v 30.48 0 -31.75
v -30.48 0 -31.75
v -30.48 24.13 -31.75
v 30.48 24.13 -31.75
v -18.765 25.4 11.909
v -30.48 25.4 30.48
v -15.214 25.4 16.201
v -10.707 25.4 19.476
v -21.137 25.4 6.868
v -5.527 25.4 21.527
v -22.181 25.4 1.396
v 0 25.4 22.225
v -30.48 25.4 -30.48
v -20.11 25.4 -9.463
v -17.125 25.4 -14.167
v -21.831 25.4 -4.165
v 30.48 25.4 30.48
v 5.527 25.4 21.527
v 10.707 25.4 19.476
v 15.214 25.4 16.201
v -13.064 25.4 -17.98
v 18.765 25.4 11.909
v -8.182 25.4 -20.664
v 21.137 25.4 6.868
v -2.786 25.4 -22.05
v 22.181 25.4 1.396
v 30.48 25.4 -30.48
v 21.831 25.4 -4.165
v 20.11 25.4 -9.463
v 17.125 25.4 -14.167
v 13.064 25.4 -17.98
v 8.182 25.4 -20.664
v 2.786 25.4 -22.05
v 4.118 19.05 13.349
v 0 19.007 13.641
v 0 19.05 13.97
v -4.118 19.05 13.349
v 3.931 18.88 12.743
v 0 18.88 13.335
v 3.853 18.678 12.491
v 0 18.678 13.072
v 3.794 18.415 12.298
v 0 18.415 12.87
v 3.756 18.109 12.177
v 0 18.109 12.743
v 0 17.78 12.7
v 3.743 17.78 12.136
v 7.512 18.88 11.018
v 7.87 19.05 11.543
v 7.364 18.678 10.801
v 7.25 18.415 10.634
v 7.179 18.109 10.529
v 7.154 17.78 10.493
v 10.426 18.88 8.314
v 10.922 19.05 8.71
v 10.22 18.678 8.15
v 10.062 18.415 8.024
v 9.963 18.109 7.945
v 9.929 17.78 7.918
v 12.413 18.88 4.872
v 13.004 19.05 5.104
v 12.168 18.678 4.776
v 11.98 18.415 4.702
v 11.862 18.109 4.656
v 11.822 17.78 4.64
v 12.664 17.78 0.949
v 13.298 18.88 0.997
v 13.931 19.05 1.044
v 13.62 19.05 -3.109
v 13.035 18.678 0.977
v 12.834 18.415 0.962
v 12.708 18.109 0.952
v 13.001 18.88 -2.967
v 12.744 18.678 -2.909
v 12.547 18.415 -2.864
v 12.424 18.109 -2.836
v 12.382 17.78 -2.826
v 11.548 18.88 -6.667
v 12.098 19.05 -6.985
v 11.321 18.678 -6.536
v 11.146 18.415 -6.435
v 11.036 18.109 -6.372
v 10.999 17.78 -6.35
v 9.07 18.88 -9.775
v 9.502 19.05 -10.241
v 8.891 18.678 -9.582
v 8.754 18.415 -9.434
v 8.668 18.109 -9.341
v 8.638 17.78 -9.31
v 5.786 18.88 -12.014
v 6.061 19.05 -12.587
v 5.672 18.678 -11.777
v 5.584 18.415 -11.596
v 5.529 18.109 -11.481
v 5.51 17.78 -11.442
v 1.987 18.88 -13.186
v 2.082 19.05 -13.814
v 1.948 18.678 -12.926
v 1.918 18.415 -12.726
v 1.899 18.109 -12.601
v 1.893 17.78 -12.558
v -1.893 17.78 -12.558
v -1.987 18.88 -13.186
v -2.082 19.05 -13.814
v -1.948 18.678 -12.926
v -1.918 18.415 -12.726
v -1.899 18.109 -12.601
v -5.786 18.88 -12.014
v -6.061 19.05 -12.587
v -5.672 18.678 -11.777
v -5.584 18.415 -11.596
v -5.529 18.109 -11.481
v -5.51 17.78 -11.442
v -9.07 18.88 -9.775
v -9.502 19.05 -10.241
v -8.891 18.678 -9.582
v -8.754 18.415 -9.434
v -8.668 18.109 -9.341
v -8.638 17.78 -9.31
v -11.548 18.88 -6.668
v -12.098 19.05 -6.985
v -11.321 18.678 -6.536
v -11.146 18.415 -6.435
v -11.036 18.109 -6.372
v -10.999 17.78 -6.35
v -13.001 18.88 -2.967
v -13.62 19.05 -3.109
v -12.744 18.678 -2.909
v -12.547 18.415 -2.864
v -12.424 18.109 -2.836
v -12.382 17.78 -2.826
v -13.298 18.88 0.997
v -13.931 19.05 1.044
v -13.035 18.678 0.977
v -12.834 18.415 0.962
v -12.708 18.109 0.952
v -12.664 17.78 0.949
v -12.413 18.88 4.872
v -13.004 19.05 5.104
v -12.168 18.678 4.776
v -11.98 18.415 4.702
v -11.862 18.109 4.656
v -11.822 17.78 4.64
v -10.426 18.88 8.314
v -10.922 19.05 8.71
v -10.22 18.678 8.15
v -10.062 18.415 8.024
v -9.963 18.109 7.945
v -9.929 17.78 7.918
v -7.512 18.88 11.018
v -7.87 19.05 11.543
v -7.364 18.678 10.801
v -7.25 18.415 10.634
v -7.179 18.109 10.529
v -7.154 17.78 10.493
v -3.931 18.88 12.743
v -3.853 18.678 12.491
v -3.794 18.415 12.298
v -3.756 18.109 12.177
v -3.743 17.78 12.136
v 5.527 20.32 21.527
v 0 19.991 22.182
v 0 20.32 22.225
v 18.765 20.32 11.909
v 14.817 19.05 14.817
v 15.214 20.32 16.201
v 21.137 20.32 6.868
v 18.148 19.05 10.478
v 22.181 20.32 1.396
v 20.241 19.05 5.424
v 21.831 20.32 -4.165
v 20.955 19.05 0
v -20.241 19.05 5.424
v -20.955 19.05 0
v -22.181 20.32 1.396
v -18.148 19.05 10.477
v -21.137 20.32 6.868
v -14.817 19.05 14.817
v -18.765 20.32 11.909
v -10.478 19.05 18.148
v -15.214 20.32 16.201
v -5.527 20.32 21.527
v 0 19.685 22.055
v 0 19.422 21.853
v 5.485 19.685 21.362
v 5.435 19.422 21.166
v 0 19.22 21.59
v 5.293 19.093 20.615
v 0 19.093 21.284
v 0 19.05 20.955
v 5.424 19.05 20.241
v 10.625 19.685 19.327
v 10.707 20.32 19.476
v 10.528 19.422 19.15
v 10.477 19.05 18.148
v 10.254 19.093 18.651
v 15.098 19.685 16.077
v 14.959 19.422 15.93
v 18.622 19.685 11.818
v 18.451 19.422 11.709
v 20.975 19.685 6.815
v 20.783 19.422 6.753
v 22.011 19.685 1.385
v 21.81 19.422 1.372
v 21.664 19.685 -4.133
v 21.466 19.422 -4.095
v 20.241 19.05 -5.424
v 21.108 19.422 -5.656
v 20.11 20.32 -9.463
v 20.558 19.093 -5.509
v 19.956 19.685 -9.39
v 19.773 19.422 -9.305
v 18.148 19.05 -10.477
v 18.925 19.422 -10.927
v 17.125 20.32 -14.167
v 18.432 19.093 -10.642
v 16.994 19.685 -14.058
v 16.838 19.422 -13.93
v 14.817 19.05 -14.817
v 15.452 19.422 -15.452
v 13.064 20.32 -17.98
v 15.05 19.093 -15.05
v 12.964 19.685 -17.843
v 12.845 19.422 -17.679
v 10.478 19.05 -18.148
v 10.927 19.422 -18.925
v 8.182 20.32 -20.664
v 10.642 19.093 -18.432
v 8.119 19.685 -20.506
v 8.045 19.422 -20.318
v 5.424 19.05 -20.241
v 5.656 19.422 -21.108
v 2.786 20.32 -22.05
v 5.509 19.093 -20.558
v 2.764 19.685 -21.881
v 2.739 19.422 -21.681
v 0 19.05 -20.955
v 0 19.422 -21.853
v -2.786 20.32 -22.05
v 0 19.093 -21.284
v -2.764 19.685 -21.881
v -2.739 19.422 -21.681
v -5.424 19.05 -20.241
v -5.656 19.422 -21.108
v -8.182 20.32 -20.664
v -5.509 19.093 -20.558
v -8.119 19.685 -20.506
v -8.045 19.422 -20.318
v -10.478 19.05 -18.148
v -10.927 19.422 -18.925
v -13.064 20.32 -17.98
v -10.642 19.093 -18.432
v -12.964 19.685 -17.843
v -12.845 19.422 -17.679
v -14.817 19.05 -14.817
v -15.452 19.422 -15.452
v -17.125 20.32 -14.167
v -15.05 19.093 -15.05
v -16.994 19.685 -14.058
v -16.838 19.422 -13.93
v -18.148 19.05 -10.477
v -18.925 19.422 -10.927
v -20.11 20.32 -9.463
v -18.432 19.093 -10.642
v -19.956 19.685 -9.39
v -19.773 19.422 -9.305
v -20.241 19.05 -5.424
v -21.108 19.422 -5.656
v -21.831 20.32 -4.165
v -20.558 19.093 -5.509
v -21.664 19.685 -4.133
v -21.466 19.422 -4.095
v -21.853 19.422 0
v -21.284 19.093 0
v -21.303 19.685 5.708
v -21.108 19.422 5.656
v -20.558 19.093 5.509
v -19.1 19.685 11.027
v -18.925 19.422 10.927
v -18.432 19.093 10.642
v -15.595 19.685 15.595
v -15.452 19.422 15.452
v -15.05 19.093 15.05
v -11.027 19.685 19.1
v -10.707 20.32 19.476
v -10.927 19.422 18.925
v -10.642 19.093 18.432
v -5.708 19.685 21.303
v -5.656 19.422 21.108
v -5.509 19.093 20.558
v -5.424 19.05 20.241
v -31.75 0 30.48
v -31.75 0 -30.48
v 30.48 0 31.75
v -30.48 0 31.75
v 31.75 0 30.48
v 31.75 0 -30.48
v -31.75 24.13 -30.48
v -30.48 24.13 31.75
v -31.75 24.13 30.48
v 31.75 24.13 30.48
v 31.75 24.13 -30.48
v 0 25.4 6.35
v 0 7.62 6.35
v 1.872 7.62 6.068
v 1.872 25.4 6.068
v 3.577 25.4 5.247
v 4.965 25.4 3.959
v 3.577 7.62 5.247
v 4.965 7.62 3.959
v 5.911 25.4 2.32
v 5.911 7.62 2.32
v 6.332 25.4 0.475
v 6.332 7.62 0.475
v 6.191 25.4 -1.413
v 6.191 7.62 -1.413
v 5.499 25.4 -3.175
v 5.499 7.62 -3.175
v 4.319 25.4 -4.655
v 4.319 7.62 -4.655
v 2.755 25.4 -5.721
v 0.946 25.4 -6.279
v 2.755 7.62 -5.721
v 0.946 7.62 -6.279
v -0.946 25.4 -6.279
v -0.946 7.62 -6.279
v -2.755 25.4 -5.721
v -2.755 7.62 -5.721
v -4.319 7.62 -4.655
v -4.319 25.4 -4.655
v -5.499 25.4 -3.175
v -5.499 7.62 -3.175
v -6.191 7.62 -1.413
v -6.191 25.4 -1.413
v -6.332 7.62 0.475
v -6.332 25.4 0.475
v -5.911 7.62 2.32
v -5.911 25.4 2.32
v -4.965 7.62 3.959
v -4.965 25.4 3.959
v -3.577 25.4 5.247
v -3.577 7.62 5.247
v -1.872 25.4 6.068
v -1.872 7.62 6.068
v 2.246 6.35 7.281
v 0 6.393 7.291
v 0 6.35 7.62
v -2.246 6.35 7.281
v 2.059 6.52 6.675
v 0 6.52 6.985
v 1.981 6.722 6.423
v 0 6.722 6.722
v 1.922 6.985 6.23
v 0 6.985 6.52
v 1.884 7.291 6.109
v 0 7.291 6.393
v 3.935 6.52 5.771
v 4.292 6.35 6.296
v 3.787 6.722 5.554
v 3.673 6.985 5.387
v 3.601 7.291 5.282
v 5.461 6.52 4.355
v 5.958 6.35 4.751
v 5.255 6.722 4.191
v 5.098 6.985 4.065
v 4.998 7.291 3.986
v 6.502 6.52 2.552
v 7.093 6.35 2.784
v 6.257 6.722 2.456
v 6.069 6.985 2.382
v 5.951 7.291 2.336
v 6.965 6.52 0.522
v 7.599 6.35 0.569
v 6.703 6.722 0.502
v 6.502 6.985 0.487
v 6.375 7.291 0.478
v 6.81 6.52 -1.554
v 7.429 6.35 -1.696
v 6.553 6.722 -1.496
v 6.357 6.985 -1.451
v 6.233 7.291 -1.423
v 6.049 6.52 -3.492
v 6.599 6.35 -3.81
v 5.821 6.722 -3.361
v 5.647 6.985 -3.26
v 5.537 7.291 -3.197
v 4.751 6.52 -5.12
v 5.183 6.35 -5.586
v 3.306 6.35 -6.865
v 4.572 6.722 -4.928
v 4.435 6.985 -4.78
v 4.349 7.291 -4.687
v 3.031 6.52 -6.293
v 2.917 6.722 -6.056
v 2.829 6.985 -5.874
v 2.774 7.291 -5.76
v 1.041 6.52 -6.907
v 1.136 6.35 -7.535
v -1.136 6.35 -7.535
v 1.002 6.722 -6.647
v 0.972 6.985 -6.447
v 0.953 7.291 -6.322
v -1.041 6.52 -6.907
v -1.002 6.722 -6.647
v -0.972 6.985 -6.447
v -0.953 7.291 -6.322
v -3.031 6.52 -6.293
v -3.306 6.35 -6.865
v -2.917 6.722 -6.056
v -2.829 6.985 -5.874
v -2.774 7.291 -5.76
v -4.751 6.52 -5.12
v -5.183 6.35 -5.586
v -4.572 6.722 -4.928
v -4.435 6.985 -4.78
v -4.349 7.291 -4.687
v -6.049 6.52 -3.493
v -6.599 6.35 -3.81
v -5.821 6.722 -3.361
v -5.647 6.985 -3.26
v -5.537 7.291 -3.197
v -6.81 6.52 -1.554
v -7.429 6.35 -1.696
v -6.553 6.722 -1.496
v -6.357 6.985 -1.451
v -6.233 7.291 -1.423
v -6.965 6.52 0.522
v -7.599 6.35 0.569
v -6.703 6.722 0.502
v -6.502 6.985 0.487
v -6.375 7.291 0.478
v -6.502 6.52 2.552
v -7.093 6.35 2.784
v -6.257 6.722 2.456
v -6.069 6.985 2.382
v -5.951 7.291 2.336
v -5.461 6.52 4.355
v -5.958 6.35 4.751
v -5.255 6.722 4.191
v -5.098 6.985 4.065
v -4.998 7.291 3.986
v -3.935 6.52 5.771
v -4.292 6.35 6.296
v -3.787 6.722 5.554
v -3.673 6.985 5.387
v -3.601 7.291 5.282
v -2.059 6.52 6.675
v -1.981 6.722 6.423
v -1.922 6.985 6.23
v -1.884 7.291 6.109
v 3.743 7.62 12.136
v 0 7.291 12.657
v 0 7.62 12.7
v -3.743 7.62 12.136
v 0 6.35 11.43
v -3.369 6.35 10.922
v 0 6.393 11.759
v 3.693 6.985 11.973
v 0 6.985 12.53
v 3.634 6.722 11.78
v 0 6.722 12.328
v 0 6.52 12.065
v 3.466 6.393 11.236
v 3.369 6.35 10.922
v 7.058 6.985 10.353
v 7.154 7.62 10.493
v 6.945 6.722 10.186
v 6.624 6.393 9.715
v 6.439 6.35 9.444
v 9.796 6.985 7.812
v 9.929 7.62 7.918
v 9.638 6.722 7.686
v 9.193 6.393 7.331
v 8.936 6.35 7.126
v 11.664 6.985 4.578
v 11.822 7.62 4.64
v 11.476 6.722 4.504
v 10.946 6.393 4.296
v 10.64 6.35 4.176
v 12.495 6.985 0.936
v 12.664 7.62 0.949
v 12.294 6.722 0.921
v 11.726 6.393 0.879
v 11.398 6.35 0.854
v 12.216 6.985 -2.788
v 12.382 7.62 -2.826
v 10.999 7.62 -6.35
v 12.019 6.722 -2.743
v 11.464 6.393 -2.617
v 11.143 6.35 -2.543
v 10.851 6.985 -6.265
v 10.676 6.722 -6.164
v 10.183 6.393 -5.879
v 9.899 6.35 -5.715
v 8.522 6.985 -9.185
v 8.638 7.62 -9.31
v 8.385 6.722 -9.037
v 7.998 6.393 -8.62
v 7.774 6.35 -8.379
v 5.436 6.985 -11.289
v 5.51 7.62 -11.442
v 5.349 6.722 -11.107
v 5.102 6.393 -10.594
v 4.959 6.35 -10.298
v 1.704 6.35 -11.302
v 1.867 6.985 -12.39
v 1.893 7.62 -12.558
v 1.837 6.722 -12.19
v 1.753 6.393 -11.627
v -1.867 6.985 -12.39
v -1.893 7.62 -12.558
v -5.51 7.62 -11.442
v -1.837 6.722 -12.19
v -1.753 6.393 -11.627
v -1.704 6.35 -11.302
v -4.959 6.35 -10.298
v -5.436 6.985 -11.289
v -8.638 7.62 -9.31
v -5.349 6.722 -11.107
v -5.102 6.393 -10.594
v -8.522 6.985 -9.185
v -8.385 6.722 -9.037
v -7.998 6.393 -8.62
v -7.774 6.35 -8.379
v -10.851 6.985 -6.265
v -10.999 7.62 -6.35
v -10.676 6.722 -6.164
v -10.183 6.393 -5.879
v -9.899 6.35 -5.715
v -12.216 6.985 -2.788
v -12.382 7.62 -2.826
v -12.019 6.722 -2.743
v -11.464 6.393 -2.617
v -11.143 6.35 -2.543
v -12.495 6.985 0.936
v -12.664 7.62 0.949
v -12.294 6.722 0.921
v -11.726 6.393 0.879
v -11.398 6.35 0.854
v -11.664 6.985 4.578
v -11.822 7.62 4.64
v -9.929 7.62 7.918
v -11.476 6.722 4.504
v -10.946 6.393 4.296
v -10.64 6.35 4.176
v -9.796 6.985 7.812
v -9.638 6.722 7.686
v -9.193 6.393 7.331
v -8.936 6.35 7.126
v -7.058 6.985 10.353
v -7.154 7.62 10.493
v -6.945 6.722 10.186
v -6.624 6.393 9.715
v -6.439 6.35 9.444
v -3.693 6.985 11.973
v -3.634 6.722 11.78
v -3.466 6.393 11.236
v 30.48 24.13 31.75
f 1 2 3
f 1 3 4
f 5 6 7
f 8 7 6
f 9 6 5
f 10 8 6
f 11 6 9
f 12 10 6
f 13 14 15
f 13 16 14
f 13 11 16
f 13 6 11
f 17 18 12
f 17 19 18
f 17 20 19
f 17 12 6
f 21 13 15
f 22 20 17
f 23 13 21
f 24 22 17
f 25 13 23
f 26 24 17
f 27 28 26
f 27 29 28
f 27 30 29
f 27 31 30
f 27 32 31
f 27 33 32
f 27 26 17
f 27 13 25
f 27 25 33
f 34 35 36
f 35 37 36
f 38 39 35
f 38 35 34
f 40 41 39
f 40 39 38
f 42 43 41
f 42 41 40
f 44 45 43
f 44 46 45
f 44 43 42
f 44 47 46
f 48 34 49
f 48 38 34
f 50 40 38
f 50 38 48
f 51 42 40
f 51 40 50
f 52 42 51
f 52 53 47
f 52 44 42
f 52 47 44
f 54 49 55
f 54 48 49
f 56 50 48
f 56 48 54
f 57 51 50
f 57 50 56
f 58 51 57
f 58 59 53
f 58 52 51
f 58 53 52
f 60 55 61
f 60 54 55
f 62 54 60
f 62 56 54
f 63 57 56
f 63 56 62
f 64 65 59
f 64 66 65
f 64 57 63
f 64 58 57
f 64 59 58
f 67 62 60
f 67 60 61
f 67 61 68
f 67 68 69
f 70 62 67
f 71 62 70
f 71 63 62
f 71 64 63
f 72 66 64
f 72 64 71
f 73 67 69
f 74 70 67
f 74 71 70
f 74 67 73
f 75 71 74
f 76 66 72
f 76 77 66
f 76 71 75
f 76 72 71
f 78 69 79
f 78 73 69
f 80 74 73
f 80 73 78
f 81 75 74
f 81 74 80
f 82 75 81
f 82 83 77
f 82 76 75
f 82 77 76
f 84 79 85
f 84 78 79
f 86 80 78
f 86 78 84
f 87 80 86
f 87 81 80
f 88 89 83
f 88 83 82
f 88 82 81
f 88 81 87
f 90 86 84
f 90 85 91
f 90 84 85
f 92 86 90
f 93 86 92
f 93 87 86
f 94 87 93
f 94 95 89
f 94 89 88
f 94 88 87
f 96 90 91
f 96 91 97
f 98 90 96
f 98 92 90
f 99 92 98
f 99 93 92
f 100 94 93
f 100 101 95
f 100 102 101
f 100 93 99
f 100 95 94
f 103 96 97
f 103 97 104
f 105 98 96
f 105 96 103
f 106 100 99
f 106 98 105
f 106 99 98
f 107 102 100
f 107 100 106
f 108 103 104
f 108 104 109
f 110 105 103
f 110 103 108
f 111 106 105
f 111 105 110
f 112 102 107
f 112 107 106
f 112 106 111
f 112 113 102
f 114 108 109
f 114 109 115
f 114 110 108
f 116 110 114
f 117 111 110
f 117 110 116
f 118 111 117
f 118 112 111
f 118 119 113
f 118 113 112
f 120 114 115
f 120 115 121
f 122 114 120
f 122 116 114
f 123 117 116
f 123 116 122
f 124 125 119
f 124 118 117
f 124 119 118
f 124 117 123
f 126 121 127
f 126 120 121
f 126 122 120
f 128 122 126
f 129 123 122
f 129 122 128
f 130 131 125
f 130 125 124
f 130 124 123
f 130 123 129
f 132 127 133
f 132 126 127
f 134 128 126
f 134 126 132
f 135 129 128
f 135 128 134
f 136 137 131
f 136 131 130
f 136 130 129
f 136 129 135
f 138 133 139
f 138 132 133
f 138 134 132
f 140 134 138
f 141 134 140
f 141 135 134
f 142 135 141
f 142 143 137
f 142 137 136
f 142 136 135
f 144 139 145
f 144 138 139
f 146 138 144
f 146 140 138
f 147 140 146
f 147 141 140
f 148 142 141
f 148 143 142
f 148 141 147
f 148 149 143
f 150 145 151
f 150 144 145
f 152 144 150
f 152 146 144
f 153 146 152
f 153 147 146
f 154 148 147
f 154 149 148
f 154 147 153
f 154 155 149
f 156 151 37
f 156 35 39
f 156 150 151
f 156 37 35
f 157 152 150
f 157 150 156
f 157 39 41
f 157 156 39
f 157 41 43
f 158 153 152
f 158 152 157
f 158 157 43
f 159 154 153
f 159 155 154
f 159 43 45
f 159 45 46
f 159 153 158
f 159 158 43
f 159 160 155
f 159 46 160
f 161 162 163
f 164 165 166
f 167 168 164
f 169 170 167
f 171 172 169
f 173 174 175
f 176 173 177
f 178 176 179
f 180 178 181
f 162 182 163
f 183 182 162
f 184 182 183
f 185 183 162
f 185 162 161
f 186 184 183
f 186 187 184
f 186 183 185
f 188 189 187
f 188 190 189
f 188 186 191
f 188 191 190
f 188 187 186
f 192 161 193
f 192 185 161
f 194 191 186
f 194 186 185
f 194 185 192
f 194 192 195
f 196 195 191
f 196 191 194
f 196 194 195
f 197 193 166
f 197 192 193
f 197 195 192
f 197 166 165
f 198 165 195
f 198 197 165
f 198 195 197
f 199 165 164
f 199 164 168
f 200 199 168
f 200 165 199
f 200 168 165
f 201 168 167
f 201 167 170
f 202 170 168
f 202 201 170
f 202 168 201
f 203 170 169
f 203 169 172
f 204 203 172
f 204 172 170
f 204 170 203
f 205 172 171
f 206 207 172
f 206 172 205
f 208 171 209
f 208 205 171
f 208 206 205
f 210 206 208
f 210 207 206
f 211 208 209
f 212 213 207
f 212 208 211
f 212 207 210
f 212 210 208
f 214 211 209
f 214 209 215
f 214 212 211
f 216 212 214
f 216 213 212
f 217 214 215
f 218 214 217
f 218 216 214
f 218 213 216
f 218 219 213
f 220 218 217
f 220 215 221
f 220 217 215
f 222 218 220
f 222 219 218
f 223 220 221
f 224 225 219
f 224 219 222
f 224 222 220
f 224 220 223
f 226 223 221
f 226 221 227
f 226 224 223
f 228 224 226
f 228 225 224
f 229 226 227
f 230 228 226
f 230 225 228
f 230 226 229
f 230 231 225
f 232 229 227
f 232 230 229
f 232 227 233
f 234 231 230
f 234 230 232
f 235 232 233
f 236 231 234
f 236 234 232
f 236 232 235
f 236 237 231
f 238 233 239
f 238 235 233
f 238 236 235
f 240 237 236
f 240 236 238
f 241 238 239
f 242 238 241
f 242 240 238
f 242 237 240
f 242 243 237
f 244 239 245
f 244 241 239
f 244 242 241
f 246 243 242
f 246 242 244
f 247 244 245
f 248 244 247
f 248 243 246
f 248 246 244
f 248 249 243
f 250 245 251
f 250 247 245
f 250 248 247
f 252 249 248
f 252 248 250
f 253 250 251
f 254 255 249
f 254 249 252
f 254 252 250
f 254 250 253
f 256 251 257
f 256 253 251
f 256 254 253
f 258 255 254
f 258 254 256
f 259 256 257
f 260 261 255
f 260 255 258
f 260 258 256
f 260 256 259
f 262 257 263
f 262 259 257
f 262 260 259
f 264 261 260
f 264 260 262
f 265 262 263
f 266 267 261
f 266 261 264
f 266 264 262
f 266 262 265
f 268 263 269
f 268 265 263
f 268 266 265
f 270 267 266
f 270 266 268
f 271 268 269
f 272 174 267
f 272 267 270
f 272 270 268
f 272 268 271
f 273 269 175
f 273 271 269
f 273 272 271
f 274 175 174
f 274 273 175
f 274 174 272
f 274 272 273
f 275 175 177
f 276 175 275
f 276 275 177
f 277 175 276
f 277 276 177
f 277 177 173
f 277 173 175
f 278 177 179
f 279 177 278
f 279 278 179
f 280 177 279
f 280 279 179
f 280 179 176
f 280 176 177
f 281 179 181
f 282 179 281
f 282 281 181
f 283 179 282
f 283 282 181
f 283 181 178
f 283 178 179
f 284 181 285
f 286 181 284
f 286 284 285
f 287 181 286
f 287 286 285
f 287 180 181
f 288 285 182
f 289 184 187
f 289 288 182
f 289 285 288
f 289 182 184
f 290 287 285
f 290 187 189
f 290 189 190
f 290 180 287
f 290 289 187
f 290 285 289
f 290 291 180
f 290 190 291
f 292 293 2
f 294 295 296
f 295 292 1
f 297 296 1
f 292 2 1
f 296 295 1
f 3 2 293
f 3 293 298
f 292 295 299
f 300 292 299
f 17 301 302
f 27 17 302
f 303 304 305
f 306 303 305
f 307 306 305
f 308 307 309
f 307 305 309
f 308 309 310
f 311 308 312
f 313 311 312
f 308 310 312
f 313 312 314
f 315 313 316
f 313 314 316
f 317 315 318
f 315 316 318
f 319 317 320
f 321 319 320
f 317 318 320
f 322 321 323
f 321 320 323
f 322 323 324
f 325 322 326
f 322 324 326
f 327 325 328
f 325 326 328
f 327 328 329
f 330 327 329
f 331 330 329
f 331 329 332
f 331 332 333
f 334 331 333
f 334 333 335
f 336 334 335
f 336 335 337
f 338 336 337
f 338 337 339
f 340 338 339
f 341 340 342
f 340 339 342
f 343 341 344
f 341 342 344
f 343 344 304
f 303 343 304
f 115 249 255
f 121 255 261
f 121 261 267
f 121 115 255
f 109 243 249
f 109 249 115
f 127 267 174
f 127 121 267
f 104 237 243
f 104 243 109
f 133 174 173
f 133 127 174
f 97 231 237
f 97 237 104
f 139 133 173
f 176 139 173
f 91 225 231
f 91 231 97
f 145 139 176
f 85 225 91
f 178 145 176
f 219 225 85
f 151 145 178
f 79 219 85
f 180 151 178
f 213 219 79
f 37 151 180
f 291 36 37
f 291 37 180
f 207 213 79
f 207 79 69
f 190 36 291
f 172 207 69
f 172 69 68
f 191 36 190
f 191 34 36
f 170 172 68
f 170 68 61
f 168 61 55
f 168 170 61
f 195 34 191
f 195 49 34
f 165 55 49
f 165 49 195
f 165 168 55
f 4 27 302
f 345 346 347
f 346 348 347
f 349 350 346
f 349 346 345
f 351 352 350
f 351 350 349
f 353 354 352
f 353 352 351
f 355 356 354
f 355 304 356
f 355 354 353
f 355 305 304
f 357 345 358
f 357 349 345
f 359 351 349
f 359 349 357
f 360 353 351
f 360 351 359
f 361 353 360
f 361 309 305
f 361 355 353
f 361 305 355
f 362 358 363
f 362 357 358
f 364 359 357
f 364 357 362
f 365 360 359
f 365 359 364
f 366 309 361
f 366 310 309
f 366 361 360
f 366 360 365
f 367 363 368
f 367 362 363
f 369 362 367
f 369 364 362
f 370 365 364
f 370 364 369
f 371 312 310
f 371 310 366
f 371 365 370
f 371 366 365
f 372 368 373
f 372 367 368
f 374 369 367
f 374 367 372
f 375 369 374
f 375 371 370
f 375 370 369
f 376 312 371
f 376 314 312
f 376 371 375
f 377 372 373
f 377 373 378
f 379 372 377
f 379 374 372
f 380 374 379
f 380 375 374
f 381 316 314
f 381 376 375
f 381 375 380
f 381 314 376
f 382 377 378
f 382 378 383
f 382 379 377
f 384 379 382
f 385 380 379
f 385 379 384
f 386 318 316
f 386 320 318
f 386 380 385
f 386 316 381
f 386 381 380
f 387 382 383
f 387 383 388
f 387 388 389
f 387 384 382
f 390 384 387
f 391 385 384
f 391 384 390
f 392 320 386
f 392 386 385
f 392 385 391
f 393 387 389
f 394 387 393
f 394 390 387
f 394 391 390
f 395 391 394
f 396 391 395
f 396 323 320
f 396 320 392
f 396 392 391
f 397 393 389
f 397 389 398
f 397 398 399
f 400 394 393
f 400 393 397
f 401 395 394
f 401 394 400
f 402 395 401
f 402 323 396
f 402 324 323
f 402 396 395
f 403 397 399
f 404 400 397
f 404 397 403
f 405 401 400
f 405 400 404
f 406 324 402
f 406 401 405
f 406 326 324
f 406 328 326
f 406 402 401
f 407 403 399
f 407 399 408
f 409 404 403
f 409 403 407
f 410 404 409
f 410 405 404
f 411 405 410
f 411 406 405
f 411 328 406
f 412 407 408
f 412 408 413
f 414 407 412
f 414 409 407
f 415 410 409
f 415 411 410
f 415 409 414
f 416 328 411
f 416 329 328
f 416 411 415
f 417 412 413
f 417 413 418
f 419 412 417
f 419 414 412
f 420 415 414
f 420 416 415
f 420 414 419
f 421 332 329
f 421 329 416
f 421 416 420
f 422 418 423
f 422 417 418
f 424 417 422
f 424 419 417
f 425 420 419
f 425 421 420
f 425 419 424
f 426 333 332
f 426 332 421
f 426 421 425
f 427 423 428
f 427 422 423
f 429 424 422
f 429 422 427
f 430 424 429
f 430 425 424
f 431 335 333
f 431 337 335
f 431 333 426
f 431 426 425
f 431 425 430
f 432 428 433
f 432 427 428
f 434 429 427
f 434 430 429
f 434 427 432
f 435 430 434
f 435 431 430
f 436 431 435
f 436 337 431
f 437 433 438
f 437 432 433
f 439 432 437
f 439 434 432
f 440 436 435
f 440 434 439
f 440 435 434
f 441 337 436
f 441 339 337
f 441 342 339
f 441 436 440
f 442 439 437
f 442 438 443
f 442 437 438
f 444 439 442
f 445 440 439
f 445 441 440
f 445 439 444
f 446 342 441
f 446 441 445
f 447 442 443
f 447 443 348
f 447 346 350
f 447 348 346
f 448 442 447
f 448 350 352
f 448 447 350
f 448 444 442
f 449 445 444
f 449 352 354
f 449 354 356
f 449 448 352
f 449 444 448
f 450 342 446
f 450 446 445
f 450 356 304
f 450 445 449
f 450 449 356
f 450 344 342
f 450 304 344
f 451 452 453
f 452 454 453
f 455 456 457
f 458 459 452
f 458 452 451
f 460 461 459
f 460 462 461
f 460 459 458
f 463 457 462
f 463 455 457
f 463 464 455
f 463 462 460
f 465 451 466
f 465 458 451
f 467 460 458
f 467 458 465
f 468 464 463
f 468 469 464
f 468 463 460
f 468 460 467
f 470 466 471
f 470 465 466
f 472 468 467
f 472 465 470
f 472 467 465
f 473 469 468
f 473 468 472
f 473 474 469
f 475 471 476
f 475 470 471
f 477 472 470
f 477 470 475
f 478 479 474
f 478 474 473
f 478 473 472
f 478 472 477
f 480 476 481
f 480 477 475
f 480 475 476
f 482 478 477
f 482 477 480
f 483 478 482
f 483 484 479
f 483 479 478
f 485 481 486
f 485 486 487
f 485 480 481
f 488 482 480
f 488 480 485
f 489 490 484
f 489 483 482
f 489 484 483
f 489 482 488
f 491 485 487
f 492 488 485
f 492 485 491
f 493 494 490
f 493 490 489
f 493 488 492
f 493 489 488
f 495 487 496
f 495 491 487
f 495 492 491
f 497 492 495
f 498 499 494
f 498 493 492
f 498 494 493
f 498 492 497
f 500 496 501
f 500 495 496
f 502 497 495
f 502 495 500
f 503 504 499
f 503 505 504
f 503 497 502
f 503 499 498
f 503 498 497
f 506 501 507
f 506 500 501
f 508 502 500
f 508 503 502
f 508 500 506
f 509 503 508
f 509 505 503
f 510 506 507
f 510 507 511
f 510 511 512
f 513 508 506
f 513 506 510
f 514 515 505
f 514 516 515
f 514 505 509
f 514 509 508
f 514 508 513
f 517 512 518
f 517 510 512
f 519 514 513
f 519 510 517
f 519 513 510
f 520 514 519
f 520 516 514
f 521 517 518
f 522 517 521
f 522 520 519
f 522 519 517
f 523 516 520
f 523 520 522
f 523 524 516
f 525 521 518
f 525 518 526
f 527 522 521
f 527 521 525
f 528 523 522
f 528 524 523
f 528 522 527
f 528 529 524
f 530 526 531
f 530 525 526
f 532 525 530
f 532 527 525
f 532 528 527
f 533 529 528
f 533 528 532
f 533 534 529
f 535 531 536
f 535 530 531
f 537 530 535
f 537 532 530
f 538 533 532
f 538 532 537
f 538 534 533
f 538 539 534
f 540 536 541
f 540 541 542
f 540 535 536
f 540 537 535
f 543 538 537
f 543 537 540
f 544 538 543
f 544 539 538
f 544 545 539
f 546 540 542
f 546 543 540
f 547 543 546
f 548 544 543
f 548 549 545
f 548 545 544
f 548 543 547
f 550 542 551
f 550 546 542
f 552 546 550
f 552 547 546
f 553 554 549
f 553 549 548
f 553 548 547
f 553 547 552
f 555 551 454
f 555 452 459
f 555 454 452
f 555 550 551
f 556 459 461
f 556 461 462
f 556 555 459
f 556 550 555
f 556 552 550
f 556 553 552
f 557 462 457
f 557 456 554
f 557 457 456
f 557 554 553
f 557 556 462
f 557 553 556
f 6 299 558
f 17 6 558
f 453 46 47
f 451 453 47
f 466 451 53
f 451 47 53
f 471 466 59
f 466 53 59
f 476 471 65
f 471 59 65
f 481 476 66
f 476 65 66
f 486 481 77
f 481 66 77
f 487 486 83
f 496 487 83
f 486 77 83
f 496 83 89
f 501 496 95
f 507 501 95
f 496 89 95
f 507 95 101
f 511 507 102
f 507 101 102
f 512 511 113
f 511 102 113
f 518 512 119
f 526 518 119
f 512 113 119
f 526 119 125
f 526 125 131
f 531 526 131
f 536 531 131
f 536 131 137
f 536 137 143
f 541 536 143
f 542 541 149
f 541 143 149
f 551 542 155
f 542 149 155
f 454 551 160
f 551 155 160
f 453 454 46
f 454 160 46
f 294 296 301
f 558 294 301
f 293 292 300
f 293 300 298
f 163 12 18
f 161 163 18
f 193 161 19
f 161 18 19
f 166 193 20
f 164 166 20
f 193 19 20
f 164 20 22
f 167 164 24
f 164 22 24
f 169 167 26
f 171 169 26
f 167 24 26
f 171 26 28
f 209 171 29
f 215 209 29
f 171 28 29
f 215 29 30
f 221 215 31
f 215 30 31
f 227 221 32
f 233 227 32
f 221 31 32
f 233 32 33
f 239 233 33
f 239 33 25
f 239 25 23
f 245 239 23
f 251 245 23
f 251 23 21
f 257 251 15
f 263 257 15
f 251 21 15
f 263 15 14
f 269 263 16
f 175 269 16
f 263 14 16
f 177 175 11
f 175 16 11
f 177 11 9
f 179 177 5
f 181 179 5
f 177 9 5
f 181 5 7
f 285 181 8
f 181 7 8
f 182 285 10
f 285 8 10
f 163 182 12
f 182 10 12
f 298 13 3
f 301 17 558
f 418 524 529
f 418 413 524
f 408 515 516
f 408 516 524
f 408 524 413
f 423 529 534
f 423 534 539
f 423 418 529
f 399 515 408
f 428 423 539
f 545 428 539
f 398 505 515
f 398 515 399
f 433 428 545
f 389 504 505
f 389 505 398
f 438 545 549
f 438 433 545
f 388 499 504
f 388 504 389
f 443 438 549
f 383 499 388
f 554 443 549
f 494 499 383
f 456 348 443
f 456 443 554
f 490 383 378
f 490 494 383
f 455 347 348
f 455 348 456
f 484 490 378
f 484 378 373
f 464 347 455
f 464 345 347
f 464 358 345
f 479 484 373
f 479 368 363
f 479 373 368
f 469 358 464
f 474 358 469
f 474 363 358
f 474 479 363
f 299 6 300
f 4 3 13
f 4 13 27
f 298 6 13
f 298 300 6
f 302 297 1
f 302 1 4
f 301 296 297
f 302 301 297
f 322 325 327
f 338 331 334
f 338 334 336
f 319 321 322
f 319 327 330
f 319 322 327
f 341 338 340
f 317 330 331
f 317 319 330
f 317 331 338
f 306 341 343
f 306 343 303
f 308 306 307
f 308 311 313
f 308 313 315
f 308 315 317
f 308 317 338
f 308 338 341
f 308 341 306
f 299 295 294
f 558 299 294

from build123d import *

# Parameters (mm, degrees)
SKETCH1_W           = 63.5
SKETCH1_H           = 63.5
BOSS_EXTRUDE1_DEPTH = 25.4
SKETCH2_R           = 22.225
CUT_EXTRUDE1_DEPTH  = 6.35
SKETCH3_R           = 12.7
CUT_EXTRUDE2_DEPTH  = 12.7
SKETCH4_R           = 6.35
BOSS_EXTRUDE2_DEPTH = 19.05
FILLET1_R           = 1.27
CHAMFER1_SIZE       = 1.27


with BuildPart() as part:
    # Sketch1 → Boss-Extrude1 (new body)
    with BuildSketch(Plane(origin=(0, 0, 0), x_dir=(1, 0, 0), z_dir=(0, 1, 0))):
        Rectangle(SKETCH1_W, SKETCH1_H)
    extrude(amount=BOSS_EXTRUDE1_DEPTH)

    # Sketch2 → Cut-Extrude1 (cut)
    with BuildSketch(Plane(origin=(0, 25.4, 0), x_dir=(1, 0, 0), z_dir=(0, 1, 0))):
        with Locations(Location((0, 0, 0), (0, 0, 270))):
            Circle(SKETCH2_R)
    extrude(amount=-CUT_EXTRUDE1_DEPTH, mode=Mode.SUBTRACT)

    # Sketch3 → Cut-Extrude2 (cut)
    with BuildSketch(Plane(origin=(0, 19.05, 0), x_dir=(1, 0, 0), z_dir=(0, 1, 0))):
        with Locations(Location((0, 0, 0), (0, 0, 270))):
            Circle(SKETCH3_R)
    extrude(amount=-CUT_EXTRUDE2_DEPTH, mode=Mode.SUBTRACT)

    # Sketch4 → Boss-Extrude2 (add)
    with BuildSketch(Plane(origin=(0, 6.35, 0), x_dir=(1, 0, 0), z_dir=(0, 1, 0))):
        with Locations(Location((0, 0, 0), (0, 0, 270))):
            Circle(SKETCH4_R)
    extrude(amount=BOSS_EXTRUDE2_DEPTH)

    # Fillet1
    fillet1_edges = [part.edges().sort_by_distance(p)[0] for p in [
        (0, 19.05, -22.225),
        (0, 6.35, -12.7),
        (0, 19.05, -12.7),
        (0, 6.35, -6.35),
    ]]
    fillet(fillet1_edges, radius=FILLET1_R)

    # Chamfer1
    chamfer1_edges = [part.edges().sort_by_distance(p)[0] for p in [
        (-31.75, 25.4, 0),
        (0, 25.4, 31.75),
        (31.75, 25.4, 0),
        (0, 25.4, -31.75),
        (31.75, 12.7, 31.75),
        (-31.75, 12.7, 31.75),
        (-31.75, 12.7, -31.75),
        (31.75, 12.7, -31.75),
    ]]
    chamfer(chamfer1_edges, length=CHAMFER1_SIZE)


solid = part.part
